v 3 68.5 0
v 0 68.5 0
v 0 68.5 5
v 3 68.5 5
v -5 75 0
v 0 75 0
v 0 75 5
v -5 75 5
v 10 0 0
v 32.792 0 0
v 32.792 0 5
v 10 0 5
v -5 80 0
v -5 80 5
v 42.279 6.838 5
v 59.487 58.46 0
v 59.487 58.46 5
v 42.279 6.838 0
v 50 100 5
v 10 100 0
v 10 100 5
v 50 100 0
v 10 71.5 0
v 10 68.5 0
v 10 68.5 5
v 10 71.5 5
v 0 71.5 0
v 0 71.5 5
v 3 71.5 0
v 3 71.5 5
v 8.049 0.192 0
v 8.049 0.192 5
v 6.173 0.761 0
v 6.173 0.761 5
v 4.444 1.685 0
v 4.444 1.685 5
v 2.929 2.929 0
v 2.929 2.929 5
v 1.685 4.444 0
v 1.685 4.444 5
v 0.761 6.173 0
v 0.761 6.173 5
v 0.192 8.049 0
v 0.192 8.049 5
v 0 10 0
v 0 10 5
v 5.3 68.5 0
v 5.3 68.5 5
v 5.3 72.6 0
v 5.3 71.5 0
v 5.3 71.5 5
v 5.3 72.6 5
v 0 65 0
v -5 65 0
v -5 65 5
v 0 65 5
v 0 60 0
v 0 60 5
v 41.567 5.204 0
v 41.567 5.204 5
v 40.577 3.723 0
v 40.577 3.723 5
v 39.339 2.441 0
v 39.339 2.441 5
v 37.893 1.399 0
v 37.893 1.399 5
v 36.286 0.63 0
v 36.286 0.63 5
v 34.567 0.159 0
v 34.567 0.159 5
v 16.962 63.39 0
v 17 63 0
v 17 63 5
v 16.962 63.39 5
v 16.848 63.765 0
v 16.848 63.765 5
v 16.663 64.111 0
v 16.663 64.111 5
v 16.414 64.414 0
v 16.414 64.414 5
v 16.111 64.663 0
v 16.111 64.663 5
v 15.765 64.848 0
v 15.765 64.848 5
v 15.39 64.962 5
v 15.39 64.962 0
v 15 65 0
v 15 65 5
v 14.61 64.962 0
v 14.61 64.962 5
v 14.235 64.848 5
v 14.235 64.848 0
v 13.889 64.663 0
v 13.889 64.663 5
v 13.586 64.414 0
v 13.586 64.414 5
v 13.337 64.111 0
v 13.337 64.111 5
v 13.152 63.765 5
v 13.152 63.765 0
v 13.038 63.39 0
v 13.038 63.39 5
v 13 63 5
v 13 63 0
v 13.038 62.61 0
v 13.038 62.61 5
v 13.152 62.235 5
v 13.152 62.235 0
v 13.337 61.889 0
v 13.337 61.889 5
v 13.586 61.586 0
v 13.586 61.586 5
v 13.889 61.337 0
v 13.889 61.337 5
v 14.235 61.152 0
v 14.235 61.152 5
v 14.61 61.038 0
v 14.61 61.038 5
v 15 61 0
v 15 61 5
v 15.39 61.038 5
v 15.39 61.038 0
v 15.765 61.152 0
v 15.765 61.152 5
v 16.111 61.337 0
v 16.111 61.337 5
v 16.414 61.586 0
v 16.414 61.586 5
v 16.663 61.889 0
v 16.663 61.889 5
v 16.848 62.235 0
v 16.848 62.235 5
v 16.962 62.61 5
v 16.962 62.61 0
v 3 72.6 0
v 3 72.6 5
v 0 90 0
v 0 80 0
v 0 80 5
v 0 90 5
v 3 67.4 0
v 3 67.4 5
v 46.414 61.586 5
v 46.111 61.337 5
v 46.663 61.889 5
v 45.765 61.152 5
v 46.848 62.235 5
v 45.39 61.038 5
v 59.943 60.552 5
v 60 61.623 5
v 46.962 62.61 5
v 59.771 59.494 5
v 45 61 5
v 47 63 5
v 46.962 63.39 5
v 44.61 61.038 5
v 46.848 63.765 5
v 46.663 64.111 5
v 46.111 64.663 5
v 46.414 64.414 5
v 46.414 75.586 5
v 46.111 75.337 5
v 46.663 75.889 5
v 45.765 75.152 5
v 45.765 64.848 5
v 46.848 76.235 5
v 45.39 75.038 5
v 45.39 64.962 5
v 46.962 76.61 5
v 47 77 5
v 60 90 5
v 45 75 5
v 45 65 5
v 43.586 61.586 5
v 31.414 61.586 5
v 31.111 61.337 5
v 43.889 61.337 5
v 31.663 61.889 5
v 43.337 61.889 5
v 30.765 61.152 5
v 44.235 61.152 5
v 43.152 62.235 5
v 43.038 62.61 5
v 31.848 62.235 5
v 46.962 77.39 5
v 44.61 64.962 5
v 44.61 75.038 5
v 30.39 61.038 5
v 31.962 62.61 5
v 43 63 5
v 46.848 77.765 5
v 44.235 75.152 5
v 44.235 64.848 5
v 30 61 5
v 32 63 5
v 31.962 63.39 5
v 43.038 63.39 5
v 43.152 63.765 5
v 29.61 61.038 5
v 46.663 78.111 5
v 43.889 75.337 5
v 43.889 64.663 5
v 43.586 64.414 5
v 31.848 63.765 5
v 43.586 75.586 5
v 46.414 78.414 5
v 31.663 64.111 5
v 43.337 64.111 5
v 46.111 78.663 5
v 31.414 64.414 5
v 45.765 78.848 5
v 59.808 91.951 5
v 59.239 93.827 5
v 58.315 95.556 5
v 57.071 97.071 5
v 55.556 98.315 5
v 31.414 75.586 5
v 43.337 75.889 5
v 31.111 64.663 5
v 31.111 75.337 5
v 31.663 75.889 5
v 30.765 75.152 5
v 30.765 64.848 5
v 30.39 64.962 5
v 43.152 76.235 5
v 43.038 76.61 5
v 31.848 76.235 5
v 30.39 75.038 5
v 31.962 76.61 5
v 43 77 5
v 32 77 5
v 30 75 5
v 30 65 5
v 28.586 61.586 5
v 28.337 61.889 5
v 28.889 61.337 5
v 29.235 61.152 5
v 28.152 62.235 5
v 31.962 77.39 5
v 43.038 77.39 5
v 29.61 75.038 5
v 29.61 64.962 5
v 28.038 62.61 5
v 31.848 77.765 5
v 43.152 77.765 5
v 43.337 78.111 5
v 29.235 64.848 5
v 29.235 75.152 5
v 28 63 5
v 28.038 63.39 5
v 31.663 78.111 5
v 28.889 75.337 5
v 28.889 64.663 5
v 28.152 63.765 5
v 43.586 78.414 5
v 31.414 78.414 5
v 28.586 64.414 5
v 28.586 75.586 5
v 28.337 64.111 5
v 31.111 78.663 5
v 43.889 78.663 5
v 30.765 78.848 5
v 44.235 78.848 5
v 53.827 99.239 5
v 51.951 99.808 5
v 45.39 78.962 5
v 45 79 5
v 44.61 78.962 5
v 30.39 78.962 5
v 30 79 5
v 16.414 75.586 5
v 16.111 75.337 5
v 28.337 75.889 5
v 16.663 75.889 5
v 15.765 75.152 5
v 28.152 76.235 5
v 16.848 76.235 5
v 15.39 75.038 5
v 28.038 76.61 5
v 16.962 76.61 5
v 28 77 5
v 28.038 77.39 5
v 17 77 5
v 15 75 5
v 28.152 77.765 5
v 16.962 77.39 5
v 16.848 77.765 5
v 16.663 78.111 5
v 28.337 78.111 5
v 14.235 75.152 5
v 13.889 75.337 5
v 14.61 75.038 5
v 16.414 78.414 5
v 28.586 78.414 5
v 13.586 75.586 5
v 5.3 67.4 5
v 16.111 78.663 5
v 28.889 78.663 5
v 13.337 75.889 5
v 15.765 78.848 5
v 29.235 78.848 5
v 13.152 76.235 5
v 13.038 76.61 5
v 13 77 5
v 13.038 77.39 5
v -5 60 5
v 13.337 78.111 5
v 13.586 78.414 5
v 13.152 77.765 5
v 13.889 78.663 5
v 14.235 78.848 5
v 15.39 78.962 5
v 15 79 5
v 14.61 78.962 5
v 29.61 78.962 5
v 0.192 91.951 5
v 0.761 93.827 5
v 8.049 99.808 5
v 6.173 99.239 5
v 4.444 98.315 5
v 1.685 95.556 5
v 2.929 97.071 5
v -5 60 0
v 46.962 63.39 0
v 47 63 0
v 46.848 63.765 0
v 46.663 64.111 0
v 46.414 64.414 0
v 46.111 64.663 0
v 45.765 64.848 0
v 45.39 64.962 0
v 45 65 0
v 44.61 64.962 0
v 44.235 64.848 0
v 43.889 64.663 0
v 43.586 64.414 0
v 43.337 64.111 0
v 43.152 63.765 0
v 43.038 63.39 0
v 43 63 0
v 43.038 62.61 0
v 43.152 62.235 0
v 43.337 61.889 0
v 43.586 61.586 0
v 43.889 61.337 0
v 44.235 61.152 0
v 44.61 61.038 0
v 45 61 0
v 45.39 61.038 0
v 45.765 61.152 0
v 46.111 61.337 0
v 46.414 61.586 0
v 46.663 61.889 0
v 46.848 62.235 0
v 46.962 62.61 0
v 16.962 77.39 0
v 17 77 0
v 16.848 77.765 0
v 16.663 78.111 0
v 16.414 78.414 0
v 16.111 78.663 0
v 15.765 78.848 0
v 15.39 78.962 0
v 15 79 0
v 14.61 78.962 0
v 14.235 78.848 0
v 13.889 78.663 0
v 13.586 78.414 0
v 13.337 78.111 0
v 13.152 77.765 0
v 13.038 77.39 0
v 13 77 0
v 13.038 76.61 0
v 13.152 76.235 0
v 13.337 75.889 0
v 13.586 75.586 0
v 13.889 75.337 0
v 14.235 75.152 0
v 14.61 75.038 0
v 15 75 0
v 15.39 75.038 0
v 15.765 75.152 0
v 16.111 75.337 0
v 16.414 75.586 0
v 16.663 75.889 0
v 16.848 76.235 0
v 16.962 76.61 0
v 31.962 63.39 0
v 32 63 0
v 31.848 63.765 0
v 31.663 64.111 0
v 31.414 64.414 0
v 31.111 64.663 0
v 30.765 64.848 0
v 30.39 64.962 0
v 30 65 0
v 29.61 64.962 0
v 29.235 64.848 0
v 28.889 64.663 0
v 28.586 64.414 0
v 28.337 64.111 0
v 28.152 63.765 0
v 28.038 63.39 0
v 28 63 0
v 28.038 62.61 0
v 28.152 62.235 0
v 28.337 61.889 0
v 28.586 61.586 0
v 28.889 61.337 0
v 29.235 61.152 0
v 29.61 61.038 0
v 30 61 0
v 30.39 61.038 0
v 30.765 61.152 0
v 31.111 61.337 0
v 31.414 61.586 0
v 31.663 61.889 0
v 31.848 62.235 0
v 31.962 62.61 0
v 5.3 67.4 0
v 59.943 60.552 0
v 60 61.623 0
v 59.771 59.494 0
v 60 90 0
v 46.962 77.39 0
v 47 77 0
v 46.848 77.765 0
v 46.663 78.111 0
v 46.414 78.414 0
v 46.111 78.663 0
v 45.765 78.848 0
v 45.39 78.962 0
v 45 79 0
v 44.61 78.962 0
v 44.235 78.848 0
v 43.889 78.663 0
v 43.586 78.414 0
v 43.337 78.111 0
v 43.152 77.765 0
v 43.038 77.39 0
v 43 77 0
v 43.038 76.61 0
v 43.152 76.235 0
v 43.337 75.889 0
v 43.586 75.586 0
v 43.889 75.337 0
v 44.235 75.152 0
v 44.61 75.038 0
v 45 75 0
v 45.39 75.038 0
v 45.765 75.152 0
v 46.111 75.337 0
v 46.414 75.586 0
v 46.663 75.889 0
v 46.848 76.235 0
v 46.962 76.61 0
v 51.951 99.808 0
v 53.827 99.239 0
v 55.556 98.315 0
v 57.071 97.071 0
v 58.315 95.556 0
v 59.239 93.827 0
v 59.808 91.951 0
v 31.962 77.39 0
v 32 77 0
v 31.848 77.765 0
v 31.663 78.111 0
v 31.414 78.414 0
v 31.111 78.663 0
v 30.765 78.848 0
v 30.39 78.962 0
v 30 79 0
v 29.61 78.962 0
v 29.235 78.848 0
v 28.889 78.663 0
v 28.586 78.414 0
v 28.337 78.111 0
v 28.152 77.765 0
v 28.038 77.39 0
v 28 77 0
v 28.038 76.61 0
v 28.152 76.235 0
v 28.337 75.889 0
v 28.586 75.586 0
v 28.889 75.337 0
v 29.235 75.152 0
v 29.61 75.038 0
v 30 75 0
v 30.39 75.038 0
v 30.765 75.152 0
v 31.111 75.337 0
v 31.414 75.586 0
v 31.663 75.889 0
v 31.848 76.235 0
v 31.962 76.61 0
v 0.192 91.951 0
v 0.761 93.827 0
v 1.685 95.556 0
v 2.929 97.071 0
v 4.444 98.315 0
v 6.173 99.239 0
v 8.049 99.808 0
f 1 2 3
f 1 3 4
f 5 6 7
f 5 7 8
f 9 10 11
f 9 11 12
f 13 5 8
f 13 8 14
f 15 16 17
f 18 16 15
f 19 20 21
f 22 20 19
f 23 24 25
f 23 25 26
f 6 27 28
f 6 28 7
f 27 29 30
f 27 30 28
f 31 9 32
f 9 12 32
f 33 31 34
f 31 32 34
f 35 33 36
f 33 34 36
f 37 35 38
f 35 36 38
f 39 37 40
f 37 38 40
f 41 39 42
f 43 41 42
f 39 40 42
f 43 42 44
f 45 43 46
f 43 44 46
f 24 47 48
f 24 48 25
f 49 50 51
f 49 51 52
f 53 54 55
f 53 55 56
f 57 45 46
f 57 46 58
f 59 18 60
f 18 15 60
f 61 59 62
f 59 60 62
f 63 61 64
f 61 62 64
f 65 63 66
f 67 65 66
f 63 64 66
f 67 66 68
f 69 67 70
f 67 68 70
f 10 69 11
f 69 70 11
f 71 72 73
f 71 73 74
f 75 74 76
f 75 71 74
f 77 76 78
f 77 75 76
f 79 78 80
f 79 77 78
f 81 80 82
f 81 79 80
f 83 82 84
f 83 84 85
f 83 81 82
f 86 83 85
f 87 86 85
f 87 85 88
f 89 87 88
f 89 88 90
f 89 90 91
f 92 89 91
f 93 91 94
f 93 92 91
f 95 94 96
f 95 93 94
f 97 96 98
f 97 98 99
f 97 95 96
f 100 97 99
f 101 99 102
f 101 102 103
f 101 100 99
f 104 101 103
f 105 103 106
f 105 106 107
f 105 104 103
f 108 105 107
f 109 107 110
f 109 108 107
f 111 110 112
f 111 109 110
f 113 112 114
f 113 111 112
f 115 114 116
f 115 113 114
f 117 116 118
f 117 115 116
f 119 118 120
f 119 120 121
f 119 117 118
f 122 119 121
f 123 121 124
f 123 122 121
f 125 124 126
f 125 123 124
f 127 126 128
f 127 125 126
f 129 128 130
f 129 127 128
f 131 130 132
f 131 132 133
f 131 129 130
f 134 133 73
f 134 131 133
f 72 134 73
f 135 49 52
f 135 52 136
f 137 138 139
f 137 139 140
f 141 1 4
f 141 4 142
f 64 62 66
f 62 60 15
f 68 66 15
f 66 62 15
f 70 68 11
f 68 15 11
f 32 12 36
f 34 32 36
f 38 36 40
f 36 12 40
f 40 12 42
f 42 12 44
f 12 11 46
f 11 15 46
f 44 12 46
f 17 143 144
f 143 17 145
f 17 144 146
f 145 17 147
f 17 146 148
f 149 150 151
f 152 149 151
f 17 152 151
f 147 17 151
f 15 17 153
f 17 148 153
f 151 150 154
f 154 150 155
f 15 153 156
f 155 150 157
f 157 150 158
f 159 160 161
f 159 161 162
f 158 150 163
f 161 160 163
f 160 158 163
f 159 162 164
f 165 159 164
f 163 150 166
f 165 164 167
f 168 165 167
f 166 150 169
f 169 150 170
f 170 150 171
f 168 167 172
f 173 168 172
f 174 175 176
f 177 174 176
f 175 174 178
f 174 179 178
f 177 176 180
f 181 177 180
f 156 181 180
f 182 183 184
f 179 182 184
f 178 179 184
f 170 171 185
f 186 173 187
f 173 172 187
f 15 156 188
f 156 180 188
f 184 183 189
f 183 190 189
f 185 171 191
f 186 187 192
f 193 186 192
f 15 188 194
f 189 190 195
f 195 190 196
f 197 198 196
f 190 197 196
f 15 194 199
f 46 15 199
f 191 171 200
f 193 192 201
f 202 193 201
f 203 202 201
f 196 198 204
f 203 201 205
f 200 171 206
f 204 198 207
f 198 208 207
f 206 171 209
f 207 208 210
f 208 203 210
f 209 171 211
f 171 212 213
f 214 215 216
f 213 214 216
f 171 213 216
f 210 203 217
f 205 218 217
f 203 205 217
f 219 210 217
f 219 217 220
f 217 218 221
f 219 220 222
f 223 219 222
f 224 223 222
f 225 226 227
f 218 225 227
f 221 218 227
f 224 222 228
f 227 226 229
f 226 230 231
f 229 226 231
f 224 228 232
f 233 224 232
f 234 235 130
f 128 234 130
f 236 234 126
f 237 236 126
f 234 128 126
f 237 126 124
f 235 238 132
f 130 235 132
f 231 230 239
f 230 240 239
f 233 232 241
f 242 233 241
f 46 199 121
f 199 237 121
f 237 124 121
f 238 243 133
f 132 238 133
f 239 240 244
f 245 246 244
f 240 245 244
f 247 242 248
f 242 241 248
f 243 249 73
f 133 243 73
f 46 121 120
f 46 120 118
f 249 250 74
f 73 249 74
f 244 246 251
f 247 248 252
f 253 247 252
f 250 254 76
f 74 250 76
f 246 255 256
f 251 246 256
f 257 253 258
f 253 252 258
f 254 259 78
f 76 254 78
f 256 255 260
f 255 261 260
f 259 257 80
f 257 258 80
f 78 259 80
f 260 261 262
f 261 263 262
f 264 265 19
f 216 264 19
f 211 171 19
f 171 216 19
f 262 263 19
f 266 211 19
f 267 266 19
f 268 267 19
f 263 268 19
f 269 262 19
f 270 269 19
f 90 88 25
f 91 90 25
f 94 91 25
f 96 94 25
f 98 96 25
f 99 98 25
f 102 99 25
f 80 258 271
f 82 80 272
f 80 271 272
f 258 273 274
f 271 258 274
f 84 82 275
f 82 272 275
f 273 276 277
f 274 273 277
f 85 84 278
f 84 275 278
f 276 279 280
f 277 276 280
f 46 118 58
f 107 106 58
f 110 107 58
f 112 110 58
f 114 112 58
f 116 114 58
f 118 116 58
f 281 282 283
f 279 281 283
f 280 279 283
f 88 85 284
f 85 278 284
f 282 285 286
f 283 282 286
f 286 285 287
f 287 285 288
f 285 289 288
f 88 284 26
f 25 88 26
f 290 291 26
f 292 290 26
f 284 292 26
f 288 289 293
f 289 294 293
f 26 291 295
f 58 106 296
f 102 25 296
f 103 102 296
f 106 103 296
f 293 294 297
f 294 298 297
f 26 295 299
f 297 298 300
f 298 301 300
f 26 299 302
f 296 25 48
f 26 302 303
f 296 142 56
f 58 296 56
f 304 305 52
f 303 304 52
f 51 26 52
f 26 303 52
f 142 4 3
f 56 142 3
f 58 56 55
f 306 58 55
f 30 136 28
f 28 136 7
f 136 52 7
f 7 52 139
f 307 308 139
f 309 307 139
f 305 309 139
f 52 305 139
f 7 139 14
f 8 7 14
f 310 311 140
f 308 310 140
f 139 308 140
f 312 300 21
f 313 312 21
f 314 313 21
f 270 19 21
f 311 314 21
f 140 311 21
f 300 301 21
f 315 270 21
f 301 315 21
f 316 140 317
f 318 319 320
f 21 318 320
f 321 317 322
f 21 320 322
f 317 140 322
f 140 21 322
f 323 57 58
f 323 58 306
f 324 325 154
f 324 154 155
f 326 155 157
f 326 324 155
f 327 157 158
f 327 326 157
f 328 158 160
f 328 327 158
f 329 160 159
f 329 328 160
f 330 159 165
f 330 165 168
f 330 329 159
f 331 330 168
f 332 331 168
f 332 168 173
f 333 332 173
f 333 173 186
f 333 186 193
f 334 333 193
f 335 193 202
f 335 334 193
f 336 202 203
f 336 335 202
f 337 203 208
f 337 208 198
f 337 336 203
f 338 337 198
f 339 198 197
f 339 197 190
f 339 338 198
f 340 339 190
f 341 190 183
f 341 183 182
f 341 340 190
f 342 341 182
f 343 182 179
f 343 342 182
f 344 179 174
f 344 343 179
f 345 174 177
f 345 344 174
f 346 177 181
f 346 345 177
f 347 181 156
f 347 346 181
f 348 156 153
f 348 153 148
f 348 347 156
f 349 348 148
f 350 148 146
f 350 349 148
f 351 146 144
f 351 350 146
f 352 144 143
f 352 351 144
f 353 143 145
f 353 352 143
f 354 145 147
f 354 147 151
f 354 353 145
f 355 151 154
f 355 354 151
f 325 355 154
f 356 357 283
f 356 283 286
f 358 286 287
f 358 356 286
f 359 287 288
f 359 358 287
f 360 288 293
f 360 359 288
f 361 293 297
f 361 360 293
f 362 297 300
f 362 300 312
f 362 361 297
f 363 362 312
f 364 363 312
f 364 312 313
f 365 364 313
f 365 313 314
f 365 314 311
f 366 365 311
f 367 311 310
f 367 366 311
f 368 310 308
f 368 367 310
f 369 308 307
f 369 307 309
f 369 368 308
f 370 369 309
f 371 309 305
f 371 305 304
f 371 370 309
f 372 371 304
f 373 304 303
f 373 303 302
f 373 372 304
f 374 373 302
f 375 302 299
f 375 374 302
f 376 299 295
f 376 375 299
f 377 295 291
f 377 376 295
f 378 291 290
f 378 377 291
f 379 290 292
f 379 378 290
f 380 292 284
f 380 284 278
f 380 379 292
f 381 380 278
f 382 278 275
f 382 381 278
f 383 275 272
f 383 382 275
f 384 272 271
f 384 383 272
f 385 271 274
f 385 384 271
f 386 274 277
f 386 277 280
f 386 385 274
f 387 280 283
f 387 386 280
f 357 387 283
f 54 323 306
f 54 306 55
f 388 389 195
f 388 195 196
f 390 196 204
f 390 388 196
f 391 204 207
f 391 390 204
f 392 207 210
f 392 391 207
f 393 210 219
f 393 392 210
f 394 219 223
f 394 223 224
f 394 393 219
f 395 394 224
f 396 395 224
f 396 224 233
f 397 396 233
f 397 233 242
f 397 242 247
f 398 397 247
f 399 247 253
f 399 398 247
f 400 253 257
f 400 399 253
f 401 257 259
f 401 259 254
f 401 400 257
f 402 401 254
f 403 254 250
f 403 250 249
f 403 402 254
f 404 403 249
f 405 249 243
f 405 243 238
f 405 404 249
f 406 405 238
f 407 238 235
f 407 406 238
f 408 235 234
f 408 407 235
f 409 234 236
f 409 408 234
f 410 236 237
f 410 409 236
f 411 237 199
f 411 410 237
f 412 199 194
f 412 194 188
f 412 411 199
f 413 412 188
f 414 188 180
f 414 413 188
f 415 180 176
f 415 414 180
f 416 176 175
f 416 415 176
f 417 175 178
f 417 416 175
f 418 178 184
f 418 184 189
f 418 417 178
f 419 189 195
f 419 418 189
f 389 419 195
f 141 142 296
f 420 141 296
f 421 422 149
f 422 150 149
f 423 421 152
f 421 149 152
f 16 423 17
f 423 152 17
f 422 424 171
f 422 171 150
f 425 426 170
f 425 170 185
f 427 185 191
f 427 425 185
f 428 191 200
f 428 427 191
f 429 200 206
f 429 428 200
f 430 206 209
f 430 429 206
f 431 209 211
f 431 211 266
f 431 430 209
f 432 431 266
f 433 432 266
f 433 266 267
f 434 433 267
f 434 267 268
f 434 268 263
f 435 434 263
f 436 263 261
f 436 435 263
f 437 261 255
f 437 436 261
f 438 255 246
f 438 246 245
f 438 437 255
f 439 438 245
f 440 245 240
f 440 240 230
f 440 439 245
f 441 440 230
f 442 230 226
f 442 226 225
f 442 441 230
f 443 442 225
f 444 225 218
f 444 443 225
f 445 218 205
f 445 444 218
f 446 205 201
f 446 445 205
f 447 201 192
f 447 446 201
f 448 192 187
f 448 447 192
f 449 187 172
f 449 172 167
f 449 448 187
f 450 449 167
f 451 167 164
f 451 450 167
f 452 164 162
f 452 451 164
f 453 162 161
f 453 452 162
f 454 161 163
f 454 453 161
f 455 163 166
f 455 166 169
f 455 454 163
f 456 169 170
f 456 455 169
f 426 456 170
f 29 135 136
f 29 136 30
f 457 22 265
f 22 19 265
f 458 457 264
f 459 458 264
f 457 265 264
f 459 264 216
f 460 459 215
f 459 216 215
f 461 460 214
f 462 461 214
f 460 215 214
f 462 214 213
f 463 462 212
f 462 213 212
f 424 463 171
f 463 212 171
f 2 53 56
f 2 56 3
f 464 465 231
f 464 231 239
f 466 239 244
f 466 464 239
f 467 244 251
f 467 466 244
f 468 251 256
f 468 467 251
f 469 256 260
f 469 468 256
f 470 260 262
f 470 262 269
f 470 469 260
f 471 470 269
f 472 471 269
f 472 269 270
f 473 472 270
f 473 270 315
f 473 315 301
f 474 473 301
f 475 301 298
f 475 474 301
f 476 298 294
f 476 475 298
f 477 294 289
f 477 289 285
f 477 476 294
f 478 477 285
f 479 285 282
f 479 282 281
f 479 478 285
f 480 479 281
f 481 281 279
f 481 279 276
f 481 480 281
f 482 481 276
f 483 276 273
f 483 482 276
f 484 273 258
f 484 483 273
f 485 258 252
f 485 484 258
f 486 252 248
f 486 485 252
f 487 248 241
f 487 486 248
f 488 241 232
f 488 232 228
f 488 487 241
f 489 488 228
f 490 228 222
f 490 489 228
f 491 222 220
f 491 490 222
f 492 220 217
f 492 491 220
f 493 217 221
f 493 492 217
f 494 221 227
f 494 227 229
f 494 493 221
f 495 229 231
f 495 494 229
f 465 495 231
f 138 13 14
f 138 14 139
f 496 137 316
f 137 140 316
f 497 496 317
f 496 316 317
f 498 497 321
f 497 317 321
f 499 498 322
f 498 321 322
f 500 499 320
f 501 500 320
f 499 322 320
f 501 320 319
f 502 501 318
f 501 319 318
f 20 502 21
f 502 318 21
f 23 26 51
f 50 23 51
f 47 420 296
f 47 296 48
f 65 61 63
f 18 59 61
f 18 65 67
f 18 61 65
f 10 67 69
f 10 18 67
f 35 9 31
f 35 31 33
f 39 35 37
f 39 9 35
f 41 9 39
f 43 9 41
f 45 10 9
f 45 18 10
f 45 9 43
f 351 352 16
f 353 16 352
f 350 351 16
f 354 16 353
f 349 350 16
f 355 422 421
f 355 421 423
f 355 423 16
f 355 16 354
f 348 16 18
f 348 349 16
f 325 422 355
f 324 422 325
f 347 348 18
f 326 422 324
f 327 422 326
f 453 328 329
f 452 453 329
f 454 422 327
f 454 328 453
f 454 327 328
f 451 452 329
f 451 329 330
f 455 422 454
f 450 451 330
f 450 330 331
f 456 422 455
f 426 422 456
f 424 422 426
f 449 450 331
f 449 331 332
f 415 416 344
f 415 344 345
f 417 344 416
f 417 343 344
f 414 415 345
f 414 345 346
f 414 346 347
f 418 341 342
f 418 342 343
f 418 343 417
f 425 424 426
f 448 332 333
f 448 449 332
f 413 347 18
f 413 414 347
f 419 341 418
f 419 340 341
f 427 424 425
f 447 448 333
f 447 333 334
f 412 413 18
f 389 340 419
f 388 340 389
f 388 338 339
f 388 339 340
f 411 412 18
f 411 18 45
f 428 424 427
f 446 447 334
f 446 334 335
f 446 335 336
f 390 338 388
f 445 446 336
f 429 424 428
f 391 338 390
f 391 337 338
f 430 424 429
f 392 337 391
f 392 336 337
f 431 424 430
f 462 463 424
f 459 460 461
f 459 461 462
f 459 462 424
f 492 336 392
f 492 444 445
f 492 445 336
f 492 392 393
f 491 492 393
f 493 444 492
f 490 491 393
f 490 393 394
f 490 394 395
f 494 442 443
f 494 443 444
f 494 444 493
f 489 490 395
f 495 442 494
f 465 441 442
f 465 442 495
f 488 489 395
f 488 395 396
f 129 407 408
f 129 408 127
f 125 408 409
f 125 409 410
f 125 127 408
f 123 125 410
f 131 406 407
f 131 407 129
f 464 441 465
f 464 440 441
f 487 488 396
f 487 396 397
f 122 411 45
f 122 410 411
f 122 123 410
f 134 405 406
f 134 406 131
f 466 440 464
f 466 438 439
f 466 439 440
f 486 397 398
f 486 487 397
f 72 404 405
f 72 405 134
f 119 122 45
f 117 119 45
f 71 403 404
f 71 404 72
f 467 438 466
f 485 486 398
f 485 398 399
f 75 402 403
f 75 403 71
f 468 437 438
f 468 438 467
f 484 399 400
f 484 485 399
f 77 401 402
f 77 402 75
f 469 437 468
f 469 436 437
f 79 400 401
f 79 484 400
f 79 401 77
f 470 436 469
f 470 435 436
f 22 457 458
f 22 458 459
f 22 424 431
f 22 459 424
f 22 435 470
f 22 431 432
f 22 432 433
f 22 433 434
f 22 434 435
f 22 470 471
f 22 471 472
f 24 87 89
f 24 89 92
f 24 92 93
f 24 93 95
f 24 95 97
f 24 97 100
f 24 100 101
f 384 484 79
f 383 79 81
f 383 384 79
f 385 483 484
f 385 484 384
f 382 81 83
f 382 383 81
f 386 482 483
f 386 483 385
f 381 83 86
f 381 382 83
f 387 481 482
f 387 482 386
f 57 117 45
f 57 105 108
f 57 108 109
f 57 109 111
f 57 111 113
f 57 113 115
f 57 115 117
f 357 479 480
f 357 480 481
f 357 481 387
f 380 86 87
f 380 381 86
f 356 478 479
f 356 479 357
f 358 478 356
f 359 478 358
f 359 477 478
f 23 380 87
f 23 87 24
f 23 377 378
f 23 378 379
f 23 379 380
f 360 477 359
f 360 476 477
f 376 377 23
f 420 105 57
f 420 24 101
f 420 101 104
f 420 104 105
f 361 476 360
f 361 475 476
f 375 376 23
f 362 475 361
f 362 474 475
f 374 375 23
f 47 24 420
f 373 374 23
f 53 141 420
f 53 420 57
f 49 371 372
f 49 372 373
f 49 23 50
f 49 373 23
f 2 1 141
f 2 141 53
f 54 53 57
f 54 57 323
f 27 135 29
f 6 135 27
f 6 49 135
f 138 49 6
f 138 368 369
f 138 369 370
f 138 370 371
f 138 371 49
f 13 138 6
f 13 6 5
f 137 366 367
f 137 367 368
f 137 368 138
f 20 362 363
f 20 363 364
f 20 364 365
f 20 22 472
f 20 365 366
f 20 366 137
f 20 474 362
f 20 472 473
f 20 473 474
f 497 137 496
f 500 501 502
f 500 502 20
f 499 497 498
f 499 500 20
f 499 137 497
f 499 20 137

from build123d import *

# Parameters (mm, degrees)
ESQUISSE1_R        = 2
BOSS_EXTRU_1_DEPTH = 5
CONG_1_R           = 10


with BuildPart() as part:
    # Esquisse1 → Boss.-Extru.1 (new body)
    with BuildSketch(Plane.XY):
        Polygon((0, 80), (0, 100), (60, 100), (60, 60), (40, 0), (0, 0), (0, 60), (-5, 60), (-5, 65), (0, 65), (0, 68.5), (3, 68.5), (3, 67.4), (5.3, 67.4), (5.3, 68.5), (10, 68.5), (10, 71.5), (5.3, 71.5), (5.3, 72.6), (3, 72.6), (3, 71.5), (0, 71.5), (0, 75), (-5, 75), (-5, 80), align=None)
        with Locations((15, 77)):
            Circle(ESQUISSE1_R, mode=Mode.SUBTRACT)
        with Locations((30, 77)):
            Circle(ESQUISSE1_R, mode=Mode.SUBTRACT)
        with Locations((45, 77)):
            Circle(ESQUISSE1_R, mode=Mode.SUBTRACT)
        with Locations((45, 63)):
            Circle(ESQUISSE1_R, mode=Mode.SUBTRACT)
        with Locations((30, 63)):
            Circle(ESQUISSE1_R, mode=Mode.SUBTRACT)
        with Locations((15, 63)):
            Circle(ESQUISSE1_R, mode=Mode.SUBTRACT)
    extrude(amount=BOSS_EXTRU_1_DEPTH)

    # Congé1
    cong_1_edges = [part.edges().sort_by_distance(p)[0] for p in [
        (0, 100, 2.5),
        (60, 100, 2.5),
        (60, 60, 2.5),
        (40, 0, 2.5),
        (0, 0, 2.5),
    ]]
    fillet(cong_1_edges, radius=CONG_1_R)


solid = part.part
